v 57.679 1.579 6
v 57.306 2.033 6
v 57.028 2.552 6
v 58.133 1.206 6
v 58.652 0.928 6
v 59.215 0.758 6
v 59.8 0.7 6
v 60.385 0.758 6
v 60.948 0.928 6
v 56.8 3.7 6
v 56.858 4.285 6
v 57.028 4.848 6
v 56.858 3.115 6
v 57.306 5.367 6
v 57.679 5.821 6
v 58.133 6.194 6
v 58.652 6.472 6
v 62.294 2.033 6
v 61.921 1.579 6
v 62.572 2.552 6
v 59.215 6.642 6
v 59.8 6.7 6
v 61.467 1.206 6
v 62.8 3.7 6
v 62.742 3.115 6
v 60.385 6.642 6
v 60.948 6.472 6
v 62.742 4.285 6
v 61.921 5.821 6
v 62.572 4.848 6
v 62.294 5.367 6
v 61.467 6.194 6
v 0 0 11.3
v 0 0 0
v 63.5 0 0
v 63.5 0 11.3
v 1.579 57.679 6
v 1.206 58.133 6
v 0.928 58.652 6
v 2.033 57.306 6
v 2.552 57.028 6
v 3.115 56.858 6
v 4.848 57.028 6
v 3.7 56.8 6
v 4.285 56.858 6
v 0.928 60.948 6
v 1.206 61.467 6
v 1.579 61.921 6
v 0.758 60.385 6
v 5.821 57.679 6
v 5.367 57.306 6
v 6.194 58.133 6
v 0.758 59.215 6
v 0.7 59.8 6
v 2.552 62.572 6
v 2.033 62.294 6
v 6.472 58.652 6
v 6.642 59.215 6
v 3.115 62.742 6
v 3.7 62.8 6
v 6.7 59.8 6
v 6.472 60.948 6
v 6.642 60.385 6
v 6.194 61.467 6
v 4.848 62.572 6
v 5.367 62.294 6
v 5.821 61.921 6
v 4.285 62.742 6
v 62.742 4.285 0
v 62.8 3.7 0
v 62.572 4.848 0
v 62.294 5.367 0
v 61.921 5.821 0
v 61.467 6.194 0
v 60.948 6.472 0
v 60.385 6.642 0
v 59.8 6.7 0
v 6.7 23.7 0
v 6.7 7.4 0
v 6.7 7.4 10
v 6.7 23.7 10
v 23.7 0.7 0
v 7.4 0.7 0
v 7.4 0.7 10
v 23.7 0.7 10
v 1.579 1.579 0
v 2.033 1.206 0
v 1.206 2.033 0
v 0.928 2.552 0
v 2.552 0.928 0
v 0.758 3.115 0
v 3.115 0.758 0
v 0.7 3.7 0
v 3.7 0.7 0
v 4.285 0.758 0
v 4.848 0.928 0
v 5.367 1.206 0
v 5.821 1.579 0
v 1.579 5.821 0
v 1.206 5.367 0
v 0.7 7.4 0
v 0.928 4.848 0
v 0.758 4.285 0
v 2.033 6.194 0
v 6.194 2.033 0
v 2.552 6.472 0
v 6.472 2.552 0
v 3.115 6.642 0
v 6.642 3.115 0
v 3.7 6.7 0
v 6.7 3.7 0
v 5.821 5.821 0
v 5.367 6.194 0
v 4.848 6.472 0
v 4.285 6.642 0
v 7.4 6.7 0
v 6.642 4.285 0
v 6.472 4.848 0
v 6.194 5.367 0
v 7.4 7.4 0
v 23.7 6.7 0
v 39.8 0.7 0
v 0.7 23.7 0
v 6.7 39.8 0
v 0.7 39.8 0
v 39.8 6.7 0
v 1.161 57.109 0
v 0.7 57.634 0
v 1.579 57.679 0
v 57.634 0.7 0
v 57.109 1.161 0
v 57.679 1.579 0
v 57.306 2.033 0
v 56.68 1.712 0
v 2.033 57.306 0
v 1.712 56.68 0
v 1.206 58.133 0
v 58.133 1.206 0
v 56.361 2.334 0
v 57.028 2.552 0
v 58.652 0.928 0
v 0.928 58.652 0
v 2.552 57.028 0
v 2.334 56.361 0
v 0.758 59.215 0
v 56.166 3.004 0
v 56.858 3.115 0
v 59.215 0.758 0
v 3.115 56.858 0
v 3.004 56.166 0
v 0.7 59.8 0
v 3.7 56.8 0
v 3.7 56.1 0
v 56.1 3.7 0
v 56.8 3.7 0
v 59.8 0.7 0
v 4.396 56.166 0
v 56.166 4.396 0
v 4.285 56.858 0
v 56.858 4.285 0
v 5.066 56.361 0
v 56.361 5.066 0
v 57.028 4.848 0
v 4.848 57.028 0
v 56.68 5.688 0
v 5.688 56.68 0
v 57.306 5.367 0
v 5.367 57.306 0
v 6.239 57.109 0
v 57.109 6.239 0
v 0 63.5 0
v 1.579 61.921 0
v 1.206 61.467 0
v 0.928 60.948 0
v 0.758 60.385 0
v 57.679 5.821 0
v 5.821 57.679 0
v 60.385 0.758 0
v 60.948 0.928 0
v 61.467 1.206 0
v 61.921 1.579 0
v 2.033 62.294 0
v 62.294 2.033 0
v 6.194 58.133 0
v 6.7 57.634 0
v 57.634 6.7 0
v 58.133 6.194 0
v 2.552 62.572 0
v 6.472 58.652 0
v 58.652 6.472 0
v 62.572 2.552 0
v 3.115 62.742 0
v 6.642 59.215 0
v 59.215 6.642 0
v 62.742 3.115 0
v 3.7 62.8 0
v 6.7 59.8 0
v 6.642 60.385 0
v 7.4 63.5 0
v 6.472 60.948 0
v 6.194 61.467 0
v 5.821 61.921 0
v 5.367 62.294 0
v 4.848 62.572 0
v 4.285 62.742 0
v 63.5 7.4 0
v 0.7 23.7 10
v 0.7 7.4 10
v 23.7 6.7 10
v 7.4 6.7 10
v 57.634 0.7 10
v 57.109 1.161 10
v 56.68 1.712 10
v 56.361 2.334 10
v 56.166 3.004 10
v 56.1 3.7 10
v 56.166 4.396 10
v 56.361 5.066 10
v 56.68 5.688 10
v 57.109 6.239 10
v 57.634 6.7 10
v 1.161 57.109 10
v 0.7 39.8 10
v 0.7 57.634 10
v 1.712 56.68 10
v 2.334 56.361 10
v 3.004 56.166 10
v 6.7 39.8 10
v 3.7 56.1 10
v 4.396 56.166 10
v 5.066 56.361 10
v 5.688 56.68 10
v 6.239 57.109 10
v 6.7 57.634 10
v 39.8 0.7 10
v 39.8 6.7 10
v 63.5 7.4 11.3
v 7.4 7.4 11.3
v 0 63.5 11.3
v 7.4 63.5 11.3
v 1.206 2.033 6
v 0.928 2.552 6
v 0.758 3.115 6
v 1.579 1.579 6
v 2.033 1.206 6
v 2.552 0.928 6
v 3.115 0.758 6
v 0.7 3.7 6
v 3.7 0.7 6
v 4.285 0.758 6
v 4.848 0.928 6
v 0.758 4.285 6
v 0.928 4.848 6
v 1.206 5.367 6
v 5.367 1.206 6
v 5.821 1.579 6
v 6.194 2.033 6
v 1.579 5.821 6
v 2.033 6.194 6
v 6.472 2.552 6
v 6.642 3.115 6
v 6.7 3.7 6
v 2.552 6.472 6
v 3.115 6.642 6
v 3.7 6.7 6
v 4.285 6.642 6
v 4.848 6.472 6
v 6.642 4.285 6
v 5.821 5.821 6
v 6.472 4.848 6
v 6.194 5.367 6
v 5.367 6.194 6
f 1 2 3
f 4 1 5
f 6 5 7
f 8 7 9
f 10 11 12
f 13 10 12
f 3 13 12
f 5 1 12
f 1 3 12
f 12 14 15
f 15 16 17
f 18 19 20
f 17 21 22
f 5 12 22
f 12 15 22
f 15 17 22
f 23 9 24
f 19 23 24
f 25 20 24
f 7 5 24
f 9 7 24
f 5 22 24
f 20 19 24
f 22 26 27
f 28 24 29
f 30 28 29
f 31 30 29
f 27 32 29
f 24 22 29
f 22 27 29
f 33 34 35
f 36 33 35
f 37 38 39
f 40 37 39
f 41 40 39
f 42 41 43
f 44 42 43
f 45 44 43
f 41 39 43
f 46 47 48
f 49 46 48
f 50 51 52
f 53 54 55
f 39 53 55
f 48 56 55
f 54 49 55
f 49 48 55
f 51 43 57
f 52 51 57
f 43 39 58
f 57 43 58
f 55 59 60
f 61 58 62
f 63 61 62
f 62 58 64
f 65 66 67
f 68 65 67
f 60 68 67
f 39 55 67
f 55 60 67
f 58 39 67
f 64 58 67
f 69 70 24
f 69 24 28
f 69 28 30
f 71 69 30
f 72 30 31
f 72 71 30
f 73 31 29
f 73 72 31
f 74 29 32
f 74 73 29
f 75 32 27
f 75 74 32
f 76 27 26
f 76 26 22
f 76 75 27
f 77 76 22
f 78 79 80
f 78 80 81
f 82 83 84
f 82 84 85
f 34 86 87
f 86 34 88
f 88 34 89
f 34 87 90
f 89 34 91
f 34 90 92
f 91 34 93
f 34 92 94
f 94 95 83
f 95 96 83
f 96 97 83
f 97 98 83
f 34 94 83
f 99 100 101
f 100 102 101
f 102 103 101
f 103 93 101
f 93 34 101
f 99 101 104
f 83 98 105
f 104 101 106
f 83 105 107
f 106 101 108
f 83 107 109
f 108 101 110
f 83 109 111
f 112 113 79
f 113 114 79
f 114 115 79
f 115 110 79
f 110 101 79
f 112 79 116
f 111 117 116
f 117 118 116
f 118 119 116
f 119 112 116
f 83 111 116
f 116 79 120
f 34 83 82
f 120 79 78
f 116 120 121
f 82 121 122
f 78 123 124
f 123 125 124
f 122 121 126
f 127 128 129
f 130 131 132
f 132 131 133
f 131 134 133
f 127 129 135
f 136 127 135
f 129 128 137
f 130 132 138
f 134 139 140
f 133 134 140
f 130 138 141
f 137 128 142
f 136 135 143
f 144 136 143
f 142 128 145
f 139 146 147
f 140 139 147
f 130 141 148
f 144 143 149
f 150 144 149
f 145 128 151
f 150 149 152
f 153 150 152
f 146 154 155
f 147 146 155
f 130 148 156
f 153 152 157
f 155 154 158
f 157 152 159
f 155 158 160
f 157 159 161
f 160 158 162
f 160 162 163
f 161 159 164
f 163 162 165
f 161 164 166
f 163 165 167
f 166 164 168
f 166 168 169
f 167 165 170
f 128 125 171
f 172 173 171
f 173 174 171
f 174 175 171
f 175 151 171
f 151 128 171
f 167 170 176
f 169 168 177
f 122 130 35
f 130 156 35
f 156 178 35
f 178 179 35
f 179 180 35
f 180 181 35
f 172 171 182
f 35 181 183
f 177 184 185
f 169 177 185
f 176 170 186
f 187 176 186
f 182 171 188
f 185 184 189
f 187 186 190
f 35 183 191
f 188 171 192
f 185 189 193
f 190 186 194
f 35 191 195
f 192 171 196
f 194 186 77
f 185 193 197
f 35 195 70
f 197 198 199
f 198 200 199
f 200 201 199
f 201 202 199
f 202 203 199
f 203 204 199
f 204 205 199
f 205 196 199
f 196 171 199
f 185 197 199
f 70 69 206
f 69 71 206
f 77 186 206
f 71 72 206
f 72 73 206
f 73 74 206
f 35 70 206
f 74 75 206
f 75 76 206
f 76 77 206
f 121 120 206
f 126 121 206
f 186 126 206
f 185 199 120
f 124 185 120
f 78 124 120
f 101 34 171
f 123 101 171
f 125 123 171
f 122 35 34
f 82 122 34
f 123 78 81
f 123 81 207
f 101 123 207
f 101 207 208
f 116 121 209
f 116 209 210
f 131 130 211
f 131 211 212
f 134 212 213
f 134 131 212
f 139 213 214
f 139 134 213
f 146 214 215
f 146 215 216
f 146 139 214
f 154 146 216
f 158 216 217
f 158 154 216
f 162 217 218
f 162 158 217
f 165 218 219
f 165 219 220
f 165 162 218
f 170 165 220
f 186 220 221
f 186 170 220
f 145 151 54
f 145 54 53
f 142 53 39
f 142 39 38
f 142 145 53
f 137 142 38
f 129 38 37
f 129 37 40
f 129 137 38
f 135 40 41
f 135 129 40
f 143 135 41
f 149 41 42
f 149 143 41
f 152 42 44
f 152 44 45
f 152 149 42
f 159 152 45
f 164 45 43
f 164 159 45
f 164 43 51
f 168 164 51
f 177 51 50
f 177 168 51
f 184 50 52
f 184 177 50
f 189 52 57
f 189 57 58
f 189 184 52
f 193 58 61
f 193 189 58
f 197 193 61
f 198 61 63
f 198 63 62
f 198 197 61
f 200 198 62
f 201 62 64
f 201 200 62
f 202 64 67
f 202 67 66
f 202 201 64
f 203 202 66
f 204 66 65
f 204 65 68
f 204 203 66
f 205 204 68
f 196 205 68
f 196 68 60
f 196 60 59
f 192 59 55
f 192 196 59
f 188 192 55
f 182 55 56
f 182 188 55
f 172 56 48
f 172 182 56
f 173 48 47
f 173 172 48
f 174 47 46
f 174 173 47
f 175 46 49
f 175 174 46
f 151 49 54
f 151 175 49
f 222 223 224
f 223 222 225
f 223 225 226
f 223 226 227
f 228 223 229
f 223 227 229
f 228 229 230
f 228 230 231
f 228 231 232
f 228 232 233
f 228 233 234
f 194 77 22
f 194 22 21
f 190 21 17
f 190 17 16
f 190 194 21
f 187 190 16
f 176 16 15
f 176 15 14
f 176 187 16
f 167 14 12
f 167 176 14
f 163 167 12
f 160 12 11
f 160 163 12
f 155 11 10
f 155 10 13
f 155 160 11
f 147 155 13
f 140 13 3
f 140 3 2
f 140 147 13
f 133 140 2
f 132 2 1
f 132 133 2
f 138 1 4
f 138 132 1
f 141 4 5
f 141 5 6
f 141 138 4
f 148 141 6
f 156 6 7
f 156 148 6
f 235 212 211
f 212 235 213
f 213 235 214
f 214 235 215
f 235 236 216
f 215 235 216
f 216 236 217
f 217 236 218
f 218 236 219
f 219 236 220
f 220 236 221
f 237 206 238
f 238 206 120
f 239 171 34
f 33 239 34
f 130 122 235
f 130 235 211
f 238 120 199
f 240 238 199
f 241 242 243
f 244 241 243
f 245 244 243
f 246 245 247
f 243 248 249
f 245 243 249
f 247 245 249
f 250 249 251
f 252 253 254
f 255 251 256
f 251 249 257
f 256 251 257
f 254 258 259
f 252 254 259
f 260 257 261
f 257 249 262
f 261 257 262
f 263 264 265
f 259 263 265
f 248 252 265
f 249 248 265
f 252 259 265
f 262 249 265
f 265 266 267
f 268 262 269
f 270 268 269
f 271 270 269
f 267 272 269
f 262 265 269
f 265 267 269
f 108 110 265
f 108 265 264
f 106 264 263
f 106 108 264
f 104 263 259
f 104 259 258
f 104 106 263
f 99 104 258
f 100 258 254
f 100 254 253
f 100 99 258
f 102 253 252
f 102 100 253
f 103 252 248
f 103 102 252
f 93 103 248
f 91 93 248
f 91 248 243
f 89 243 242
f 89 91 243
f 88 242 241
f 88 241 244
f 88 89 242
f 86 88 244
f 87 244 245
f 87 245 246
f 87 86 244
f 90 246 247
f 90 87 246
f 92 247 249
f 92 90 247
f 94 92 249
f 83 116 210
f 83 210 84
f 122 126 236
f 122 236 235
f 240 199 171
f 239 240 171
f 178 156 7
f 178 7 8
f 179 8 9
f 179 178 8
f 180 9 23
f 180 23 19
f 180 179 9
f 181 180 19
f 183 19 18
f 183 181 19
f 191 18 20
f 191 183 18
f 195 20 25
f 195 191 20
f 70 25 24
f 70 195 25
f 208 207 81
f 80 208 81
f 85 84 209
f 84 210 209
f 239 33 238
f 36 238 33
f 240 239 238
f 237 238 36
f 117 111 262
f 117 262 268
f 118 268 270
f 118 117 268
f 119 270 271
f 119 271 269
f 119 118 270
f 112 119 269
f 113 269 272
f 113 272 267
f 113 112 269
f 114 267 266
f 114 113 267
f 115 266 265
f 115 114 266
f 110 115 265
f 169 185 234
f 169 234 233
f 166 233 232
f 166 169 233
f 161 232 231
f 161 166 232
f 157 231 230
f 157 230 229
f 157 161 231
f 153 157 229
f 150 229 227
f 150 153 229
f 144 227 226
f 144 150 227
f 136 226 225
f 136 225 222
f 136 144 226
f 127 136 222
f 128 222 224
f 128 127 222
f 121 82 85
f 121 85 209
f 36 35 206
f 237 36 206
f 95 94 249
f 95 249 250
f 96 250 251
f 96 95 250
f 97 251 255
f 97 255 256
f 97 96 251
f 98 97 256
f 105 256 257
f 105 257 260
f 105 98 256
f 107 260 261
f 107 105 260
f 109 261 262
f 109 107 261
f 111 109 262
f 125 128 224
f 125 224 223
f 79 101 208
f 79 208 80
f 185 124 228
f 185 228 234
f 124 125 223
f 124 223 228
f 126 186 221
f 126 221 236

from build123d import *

# Parameters (mm, degrees)
F0_W     = 16.1
F0_H     = 6
F0_W_2   = 6
F0_H_2   = 16.1
F0_W_3   = 0.7
F0_H_3   = 0.7
F1_DEPTH = 11.3
F2_DEPTH = 6
F3_DEPTH = 10


with BuildPart() as f1:
    # F0 (on Top) → F1 (new body)
    with BuildSketch(Plane.XY):
        with BuildLine():
            ThreePointArc((59.8, 6.7), (56.8, 3.7), (59.8, 0.7))
            ThreePointArc((59.8, 0.7), (61.9213203436, 1.5786796564), (62.8, 3.7))
            ThreePointArc((62.8, 3.7), (61.9213203436, 5.8213203436), (59.8, 6.7))
        make_face()
        with BuildLine():
            Line((7.4, 0.7), (7.4, 0))
            Line((7.4, 0), (59.8, 0))
            ThreePointArc((59.8, 0), (58.6620193323, 0.1793466515), (57.6343592172, 0.7))
            Line((57.6343592172, 0.7), (39.8, 0.7))
            Line((39.8, 0.7), (23.7, 0.7))
            Line((23.7, 0.7), (7.4, 0.7))
        make_face()
        with BuildLine():
            Line((3.7, 0.7), (5.8656407828, 0.7))
            ThreePointArc((5.8656407828, 0.7), (6.9941517039, 2.0151959901), (7.4, 3.7))
            ThreePointArc((7.4, 3.7), (7.2206533485, 4.8379806677), (6.7, 5.8656407828))
            Line((6.7, 5.8656407828), (6.7, 3.7))
            ThreePointArc((6.7, 3.7), (5.8213203436, 1.5786796564), (3.7, 0.7))
        make_face()
        with BuildLine():
            Line((0.7, 59.8), (0.7, 57.6343592172))
            ThreePointArc((0.7, 57.6343592172), (3.7, 56.1), (6.7, 57.6343592172))
            Line((6.7, 57.6343592172), (6.7, 59.8))
            ThreePointArc((6.7, 59.8), (3.7, 56.8), (0.7, 59.8))
        make_face()
        Polygon((0.7, 23.7), (0.7, 7.4), (3.7, 7.4), (6.7, 7.4), (6.7, 23.7), align=None)
        with BuildLine():
            Line((39.8, 0.7), (57.6343592172, 0.7))
            ThreePointArc((57.6343592172, 0.7), (56.1, 3.7), (57.6343592172, 6.7))
            Line((57.6343592172, 6.7), (39.8, 6.7))
            Line((39.8, 6.7), (39.8, 0.7))
        make_face()
        with BuildLine():
            ThreePointArc((3.7, 6.7), (5.8213203436, 5.8213203436), (6.7, 3.7))
            Line((6.7, 3.7), (6.7, 5.8656407828))
            ThreePointArc((6.7, 5.8656407828), (6.3162950904, 6.3162950904), (5.8656407828, 6.7))
            Line((5.8656407828, 6.7), (3.7, 6.7))
        make_face()
        with BuildLine():
            Line((6.7, 23.7), (6.7, 7.4))
            Line((6.7, 7.4), (7.4, 7.4))
            Line((7.4, 7.4), (7.4, 59.8))
            ThreePointArc((7.4, 59.8), (7.2206533485, 58.6620193323), (6.7, 57.6343592172))
            Line((6.7, 57.6343592172), (6.7, 39.8))
            Line((6.7, 39.8), (6.7, 23.7))
        make_face()
        with BuildLine():
            ThreePointArc((57.6343592172, 0.7), (58.6620193323, 0.1793466515), (59.8, 0))
            ThreePointArc((59.8, 0), (62.4162950904, 1.0837049096), (63.5, 3.7))
            ThreePointArc((63.5, 3.7), (62.4162950904, 6.3162950904), (59.8, 7.4))
            ThreePointArc((59.8, 7.4), (58.6620193323, 7.2206533485), (57.6343592172, 6.7))
            Line((57.6343592172, 6.7), (59.8, 6.7))
            ThreePointArc((59.8, 6.7), (61.9213203436, 5.8213203436), (62.8, 3.7))
            ThreePointArc((62.8, 3.7), (61.9213203436, 1.5786796564), (59.8, 0.7))
            Line((59.8, 0.7), (57.6343592172, 0.7))
        make_face()
        with BuildLine():
            Line((0, 63.5), (0, 59.8))
            ThreePointArc((0, 59.8), (1.0837049096, 62.4162950904), (3.7, 63.5))
            Line((3.7, 63.5), (0, 63.5))
        make_face()
        with BuildLine():
            ThreePointArc((63.5, 3.7), (62.4162950904, 1.0837049096), (59.8, 0))
            Line((59.8, 0), (63.5, 0))
            Line((63.5, 0), (63.5, 3.7))
        make_face()
        with BuildLine():
            Line((7.4, 63.5), (3.7, 63.5))
            ThreePointArc((3.7, 63.5), (6.3162950904, 62.4162950904), (7.4, 59.8))
            Line((7.4, 59.8), (7.4, 63.5))
        make_face()
        with BuildLine():
            ThreePointArc((59.8, 7.4), (62.4162950904, 6.3162950904), (63.5, 3.7))
            Line((63.5, 3.7), (63.5, 7.4))
            Line((63.5, 7.4), (59.8, 7.4))
        make_face()
        with BuildLine():
            Line((0, 59.8), (0, 7.4))
            Line((0, 7.4), (0.7, 7.4))
            Line((0.7, 7.4), (0.7, 23.7))
            Line((0.7, 23.7), (0.7, 39.8))
            Line((0.7, 39.8), (0.7, 57.6343592172))
            ThreePointArc((0.7, 57.6343592172), (0.1793466515, 58.6620193323), (0, 59.8))
        make_face()
        with BuildLine():
            ThreePointArc((57.6343592172, 6.7), (56.1, 3.7), (57.6343592172, 0.7))
            Line((57.6343592172, 0.7), (59.8, 0.7))
            ThreePointArc((59.8, 0.7), (56.8, 3.7), (59.8, 6.7))
            Line((59.8, 6.7), (57.6343592172, 6.7))
        make_face()
        with BuildLine():
            ThreePointArc((6.7, 57.6343592172), (3.7, 56.1), (0.7, 57.6343592172))
            Line((0.7, 57.6343592172), (0.7, 39.8))
            Line((0.7, 39.8), (6.7, 39.8))
            Line((6.7, 39.8), (6.7, 57.6343592172))
        make_face()
        Polygon((7.4, 3.7), (7.4, 0.7), (23.7, 0.7), (23.7, 6.7), (7.4, 6.7), align=None)
        with BuildLine():
            ThreePointArc((3.7, 7.4), (2.0151959901, 6.9941517039), (0.7, 5.8656407828))
            Line((0.7, 5.8656407828), (0.7, 3.7))
            ThreePointArc((0.7, 3.7), (1.5786796564, 5.8213203436), (3.7, 6.7))
            Line((3.7, 6.7), (5.8656407828, 6.7))
            ThreePointArc((5.8656407828, 6.7), (4.8379806677, 7.2206533485), (3.7, 7.4))
        make_face()
        with Locations((31.75, 3.7)):
            Rectangle(F0_W, F0_H)
        with BuildLine():
            ThreePointArc((6.7, 59.8), (3.7, 62.8), (0.7, 59.8))
            ThreePointArc((0.7, 59.8), (3.7, 56.8), (6.7, 59.8))
        make_face()
        with BuildLine():
            ThreePointArc((0, 3.7000000003), (1.0837049095, 1.0837049097), (3.7, 0))
            ThreePointArc((3.7, 0), (4.8379806677, 0.1793466515), (5.8656407828, 0.7))
            Line((5.8656407828, 0.7), (3.7, 0.7))
            ThreePointArc((3.7, 0.7), (1.5786796564, 1.5786796564), (0.7, 3.7))
            Line((0.7, 3.7), (0.7, 5.8656407828))
            ThreePointArc((0.7, 5.8656407828), (0.1793466516, 4.8379806678), (0, 3.7000000003))
        make_face()
        with BuildLine():
            ThreePointArc((3.7, 63.5), (1.0837049096, 62.4162950904), (0, 59.8))
            ThreePointArc((0, 59.8), (0.1793466515, 58.6620193323), (0.7, 57.6343592172))
            Line((0.7, 57.6343592172), (0.7, 59.8))
            ThreePointArc((0.7, 59.8), (3.7, 62.8), (6.7, 59.8))
            Line((6.7, 59.8), (6.7, 57.6343592172))
            ThreePointArc((6.7, 57.6343592172), (7.2206533485, 58.6620193323), (7.4, 59.8))
            ThreePointArc((7.4, 59.8), (6.3162950904, 62.4162950904), (3.7, 63.5))
        make_face()
        with Locations((3.7, 31.75)):
            Rectangle(F0_W_2, F0_H_2)
        with BuildLine():
            ThreePointArc((0.7, 3.7), (1.5786796564, 1.5786796564), (3.7, 0.7))
            ThreePointArc((3.7, 0.7), (5.8213203436, 1.5786796564), (6.7, 3.7))
            ThreePointArc((6.7, 3.7), (5.8213203436, 5.8213203436), (3.7, 6.7))
            ThreePointArc((3.7, 6.7), (1.5786796564, 5.8213203436), (0.7, 3.7))
        make_face()
        with BuildLine():
            Line((0, 3.7000000003), (0, 0))
            Line((0, 0), (3.7, 0))
            ThreePointArc((3.7, 0), (1.0837049095, 1.0837049097), (0, 3.7000000003))
        make_face()
        with BuildLine():
            ThreePointArc((5.8656407828, 6.7), (6.3162950904, 6.3162950904), (6.7, 5.8656407828))
            Line((6.7, 5.8656407828), (6.7, 6.7))
            Line((6.7, 6.7), (5.8656407828, 6.7))
        make_face()
        with BuildLine():
            Line((7.4, 7.4), (7.4, 6.7))
            Line((7.4, 6.7), (23.7, 6.7))
            Line((23.7, 6.7), (39.8, 6.7))
            Line((39.8, 6.7), (57.6343592172, 6.7))
            ThreePointArc((57.6343592172, 6.7), (58.6620193323, 7.2206533485), (59.8, 7.4))
            Line((59.8, 7.4), (7.4, 7.4))
        make_face()
        with BuildLine():
            ThreePointArc((5.8656407828, 0.7), (4.8379806677, 0.1793466515), (3.7, 0))
            Line((3.7, 0), (7.4, 0))
            Line((7.4, 0), (7.4, 0.7))
            Line((7.4, 0.7), (5.8656407828, 0.7))
        make_face()
        with BuildLine():
            Line((0.7, 7.4), (0.7, 5.8656407828))
            ThreePointArc((0.7, 5.8656407828), (2.0151959901, 6.9941517039), (3.7, 7.4))
            Line((3.7, 7.4), (0.7, 7.4))
        make_face()
        with BuildLine():
            Line((0, 7.4), (0, 3.7000000003))
            ThreePointArc((0, 3.7000000003), (0.1793466516, 4.8379806678), (0.7, 5.8656407828))
            Line((0.7, 5.8656407828), (0.7, 7.4))
            Line((0.7, 7.4), (0, 7.4))
        make_face()
        with BuildLine():
            Line((6.7, 7.4), (3.7, 7.4))
            ThreePointArc((3.7, 7.4), (4.8379806677, 7.2206533485), (5.8656407828, 6.7))
            Line((5.8656407828, 6.7), (6.7, 6.7))
            Line((6.7, 6.7), (6.7, 7.4))
        make_face()
        with BuildLine():
            ThreePointArc((7.4, 3.7), (6.9941517039, 2.0151959901), (5.8656407828, 0.7))
            Line((5.8656407828, 0.7), (7.4, 0.7))
            Line((7.4, 0.7), (7.4, 3.7))
        make_face()
        with BuildLine():
            ThreePointArc((6.7, 5.8656407828), (7.2206533485, 4.8379806677), (7.4, 3.7))
            Line((7.4, 3.7), (7.4, 6.7))
            Line((7.4, 6.7), (6.7, 6.7))
            Line((6.7, 6.7), (6.7, 5.8656407828))
        make_face()
        with Locations((7.05, 7.05)):
            Rectangle(F0_W_3, F0_H_3)
    extrude(amount=F1_DEPTH)

    # F0 (on Top) → F2 (cut)
    with BuildSketch(Plane.XY):
        with BuildLine():
            ThreePointArc((6.7, 59.8), (3.7, 62.8), (0.7, 59.8))
            ThreePointArc((0.7, 59.8), (3.7, 56.8), (6.7, 59.8))
        make_face()
        with BuildLine():
            ThreePointArc((0.7, 3.7), (1.5786796564, 1.5786796564), (3.7, 0.7))
            ThreePointArc((3.7, 0.7), (5.8213203436, 1.5786796564), (6.7, 3.7))
            ThreePointArc((6.7, 3.7), (5.8213203436, 5.8213203436), (3.7, 6.7))
            ThreePointArc((3.7, 6.7), (1.5786796564, 5.8213203436), (0.7, 3.7))
        make_face()
        with BuildLine():
            ThreePointArc((59.8, 6.7), (56.8, 3.7), (59.8, 0.7))
            ThreePointArc((59.8, 0.7), (61.9213203436, 1.5786796564), (62.8, 3.7))
            ThreePointArc((62.8, 3.7), (61.9213203436, 5.8213203436), (59.8, 6.7))
        make_face()
    extrude(amount=F2_DEPTH, mode=Mode.SUBTRACT)

    # F0 (on Top) → F3 (cut)
    with BuildSketch(Plane.XY):
        with BuildLine():
            ThreePointArc((6.7, 57.6343592172), (3.7, 56.1), (0.7, 57.6343592172))
            Line((0.7, 57.6343592172), (0.7, 39.8))
            Line((0.7, 39.8), (6.7, 39.8))
            Line((6.7, 39.8), (6.7, 57.6343592172))
        make_face()
        Polygon((0.7, 23.7), (0.7, 7.4), (3.7, 7.4), (6.7, 7.4), (6.7, 23.7), align=None)
        with BuildLine():
            Line((39.8, 0.7), (57.6343592172, 0.7))
            ThreePointArc((57.6343592172, 0.7), (56.1, 3.7), (57.6343592172, 6.7))
            Line((57.6343592172, 6.7), (39.8, 6.7))
            Line((39.8, 6.7), (39.8, 0.7))
        make_face()
        Polygon((7.4, 3.7), (7.4, 0.7), (23.7, 0.7), (23.7, 6.7), (7.4, 6.7), align=None)
    extrude(amount=F3_DEPTH, mode=Mode.SUBTRACT)


solid = f1.part
